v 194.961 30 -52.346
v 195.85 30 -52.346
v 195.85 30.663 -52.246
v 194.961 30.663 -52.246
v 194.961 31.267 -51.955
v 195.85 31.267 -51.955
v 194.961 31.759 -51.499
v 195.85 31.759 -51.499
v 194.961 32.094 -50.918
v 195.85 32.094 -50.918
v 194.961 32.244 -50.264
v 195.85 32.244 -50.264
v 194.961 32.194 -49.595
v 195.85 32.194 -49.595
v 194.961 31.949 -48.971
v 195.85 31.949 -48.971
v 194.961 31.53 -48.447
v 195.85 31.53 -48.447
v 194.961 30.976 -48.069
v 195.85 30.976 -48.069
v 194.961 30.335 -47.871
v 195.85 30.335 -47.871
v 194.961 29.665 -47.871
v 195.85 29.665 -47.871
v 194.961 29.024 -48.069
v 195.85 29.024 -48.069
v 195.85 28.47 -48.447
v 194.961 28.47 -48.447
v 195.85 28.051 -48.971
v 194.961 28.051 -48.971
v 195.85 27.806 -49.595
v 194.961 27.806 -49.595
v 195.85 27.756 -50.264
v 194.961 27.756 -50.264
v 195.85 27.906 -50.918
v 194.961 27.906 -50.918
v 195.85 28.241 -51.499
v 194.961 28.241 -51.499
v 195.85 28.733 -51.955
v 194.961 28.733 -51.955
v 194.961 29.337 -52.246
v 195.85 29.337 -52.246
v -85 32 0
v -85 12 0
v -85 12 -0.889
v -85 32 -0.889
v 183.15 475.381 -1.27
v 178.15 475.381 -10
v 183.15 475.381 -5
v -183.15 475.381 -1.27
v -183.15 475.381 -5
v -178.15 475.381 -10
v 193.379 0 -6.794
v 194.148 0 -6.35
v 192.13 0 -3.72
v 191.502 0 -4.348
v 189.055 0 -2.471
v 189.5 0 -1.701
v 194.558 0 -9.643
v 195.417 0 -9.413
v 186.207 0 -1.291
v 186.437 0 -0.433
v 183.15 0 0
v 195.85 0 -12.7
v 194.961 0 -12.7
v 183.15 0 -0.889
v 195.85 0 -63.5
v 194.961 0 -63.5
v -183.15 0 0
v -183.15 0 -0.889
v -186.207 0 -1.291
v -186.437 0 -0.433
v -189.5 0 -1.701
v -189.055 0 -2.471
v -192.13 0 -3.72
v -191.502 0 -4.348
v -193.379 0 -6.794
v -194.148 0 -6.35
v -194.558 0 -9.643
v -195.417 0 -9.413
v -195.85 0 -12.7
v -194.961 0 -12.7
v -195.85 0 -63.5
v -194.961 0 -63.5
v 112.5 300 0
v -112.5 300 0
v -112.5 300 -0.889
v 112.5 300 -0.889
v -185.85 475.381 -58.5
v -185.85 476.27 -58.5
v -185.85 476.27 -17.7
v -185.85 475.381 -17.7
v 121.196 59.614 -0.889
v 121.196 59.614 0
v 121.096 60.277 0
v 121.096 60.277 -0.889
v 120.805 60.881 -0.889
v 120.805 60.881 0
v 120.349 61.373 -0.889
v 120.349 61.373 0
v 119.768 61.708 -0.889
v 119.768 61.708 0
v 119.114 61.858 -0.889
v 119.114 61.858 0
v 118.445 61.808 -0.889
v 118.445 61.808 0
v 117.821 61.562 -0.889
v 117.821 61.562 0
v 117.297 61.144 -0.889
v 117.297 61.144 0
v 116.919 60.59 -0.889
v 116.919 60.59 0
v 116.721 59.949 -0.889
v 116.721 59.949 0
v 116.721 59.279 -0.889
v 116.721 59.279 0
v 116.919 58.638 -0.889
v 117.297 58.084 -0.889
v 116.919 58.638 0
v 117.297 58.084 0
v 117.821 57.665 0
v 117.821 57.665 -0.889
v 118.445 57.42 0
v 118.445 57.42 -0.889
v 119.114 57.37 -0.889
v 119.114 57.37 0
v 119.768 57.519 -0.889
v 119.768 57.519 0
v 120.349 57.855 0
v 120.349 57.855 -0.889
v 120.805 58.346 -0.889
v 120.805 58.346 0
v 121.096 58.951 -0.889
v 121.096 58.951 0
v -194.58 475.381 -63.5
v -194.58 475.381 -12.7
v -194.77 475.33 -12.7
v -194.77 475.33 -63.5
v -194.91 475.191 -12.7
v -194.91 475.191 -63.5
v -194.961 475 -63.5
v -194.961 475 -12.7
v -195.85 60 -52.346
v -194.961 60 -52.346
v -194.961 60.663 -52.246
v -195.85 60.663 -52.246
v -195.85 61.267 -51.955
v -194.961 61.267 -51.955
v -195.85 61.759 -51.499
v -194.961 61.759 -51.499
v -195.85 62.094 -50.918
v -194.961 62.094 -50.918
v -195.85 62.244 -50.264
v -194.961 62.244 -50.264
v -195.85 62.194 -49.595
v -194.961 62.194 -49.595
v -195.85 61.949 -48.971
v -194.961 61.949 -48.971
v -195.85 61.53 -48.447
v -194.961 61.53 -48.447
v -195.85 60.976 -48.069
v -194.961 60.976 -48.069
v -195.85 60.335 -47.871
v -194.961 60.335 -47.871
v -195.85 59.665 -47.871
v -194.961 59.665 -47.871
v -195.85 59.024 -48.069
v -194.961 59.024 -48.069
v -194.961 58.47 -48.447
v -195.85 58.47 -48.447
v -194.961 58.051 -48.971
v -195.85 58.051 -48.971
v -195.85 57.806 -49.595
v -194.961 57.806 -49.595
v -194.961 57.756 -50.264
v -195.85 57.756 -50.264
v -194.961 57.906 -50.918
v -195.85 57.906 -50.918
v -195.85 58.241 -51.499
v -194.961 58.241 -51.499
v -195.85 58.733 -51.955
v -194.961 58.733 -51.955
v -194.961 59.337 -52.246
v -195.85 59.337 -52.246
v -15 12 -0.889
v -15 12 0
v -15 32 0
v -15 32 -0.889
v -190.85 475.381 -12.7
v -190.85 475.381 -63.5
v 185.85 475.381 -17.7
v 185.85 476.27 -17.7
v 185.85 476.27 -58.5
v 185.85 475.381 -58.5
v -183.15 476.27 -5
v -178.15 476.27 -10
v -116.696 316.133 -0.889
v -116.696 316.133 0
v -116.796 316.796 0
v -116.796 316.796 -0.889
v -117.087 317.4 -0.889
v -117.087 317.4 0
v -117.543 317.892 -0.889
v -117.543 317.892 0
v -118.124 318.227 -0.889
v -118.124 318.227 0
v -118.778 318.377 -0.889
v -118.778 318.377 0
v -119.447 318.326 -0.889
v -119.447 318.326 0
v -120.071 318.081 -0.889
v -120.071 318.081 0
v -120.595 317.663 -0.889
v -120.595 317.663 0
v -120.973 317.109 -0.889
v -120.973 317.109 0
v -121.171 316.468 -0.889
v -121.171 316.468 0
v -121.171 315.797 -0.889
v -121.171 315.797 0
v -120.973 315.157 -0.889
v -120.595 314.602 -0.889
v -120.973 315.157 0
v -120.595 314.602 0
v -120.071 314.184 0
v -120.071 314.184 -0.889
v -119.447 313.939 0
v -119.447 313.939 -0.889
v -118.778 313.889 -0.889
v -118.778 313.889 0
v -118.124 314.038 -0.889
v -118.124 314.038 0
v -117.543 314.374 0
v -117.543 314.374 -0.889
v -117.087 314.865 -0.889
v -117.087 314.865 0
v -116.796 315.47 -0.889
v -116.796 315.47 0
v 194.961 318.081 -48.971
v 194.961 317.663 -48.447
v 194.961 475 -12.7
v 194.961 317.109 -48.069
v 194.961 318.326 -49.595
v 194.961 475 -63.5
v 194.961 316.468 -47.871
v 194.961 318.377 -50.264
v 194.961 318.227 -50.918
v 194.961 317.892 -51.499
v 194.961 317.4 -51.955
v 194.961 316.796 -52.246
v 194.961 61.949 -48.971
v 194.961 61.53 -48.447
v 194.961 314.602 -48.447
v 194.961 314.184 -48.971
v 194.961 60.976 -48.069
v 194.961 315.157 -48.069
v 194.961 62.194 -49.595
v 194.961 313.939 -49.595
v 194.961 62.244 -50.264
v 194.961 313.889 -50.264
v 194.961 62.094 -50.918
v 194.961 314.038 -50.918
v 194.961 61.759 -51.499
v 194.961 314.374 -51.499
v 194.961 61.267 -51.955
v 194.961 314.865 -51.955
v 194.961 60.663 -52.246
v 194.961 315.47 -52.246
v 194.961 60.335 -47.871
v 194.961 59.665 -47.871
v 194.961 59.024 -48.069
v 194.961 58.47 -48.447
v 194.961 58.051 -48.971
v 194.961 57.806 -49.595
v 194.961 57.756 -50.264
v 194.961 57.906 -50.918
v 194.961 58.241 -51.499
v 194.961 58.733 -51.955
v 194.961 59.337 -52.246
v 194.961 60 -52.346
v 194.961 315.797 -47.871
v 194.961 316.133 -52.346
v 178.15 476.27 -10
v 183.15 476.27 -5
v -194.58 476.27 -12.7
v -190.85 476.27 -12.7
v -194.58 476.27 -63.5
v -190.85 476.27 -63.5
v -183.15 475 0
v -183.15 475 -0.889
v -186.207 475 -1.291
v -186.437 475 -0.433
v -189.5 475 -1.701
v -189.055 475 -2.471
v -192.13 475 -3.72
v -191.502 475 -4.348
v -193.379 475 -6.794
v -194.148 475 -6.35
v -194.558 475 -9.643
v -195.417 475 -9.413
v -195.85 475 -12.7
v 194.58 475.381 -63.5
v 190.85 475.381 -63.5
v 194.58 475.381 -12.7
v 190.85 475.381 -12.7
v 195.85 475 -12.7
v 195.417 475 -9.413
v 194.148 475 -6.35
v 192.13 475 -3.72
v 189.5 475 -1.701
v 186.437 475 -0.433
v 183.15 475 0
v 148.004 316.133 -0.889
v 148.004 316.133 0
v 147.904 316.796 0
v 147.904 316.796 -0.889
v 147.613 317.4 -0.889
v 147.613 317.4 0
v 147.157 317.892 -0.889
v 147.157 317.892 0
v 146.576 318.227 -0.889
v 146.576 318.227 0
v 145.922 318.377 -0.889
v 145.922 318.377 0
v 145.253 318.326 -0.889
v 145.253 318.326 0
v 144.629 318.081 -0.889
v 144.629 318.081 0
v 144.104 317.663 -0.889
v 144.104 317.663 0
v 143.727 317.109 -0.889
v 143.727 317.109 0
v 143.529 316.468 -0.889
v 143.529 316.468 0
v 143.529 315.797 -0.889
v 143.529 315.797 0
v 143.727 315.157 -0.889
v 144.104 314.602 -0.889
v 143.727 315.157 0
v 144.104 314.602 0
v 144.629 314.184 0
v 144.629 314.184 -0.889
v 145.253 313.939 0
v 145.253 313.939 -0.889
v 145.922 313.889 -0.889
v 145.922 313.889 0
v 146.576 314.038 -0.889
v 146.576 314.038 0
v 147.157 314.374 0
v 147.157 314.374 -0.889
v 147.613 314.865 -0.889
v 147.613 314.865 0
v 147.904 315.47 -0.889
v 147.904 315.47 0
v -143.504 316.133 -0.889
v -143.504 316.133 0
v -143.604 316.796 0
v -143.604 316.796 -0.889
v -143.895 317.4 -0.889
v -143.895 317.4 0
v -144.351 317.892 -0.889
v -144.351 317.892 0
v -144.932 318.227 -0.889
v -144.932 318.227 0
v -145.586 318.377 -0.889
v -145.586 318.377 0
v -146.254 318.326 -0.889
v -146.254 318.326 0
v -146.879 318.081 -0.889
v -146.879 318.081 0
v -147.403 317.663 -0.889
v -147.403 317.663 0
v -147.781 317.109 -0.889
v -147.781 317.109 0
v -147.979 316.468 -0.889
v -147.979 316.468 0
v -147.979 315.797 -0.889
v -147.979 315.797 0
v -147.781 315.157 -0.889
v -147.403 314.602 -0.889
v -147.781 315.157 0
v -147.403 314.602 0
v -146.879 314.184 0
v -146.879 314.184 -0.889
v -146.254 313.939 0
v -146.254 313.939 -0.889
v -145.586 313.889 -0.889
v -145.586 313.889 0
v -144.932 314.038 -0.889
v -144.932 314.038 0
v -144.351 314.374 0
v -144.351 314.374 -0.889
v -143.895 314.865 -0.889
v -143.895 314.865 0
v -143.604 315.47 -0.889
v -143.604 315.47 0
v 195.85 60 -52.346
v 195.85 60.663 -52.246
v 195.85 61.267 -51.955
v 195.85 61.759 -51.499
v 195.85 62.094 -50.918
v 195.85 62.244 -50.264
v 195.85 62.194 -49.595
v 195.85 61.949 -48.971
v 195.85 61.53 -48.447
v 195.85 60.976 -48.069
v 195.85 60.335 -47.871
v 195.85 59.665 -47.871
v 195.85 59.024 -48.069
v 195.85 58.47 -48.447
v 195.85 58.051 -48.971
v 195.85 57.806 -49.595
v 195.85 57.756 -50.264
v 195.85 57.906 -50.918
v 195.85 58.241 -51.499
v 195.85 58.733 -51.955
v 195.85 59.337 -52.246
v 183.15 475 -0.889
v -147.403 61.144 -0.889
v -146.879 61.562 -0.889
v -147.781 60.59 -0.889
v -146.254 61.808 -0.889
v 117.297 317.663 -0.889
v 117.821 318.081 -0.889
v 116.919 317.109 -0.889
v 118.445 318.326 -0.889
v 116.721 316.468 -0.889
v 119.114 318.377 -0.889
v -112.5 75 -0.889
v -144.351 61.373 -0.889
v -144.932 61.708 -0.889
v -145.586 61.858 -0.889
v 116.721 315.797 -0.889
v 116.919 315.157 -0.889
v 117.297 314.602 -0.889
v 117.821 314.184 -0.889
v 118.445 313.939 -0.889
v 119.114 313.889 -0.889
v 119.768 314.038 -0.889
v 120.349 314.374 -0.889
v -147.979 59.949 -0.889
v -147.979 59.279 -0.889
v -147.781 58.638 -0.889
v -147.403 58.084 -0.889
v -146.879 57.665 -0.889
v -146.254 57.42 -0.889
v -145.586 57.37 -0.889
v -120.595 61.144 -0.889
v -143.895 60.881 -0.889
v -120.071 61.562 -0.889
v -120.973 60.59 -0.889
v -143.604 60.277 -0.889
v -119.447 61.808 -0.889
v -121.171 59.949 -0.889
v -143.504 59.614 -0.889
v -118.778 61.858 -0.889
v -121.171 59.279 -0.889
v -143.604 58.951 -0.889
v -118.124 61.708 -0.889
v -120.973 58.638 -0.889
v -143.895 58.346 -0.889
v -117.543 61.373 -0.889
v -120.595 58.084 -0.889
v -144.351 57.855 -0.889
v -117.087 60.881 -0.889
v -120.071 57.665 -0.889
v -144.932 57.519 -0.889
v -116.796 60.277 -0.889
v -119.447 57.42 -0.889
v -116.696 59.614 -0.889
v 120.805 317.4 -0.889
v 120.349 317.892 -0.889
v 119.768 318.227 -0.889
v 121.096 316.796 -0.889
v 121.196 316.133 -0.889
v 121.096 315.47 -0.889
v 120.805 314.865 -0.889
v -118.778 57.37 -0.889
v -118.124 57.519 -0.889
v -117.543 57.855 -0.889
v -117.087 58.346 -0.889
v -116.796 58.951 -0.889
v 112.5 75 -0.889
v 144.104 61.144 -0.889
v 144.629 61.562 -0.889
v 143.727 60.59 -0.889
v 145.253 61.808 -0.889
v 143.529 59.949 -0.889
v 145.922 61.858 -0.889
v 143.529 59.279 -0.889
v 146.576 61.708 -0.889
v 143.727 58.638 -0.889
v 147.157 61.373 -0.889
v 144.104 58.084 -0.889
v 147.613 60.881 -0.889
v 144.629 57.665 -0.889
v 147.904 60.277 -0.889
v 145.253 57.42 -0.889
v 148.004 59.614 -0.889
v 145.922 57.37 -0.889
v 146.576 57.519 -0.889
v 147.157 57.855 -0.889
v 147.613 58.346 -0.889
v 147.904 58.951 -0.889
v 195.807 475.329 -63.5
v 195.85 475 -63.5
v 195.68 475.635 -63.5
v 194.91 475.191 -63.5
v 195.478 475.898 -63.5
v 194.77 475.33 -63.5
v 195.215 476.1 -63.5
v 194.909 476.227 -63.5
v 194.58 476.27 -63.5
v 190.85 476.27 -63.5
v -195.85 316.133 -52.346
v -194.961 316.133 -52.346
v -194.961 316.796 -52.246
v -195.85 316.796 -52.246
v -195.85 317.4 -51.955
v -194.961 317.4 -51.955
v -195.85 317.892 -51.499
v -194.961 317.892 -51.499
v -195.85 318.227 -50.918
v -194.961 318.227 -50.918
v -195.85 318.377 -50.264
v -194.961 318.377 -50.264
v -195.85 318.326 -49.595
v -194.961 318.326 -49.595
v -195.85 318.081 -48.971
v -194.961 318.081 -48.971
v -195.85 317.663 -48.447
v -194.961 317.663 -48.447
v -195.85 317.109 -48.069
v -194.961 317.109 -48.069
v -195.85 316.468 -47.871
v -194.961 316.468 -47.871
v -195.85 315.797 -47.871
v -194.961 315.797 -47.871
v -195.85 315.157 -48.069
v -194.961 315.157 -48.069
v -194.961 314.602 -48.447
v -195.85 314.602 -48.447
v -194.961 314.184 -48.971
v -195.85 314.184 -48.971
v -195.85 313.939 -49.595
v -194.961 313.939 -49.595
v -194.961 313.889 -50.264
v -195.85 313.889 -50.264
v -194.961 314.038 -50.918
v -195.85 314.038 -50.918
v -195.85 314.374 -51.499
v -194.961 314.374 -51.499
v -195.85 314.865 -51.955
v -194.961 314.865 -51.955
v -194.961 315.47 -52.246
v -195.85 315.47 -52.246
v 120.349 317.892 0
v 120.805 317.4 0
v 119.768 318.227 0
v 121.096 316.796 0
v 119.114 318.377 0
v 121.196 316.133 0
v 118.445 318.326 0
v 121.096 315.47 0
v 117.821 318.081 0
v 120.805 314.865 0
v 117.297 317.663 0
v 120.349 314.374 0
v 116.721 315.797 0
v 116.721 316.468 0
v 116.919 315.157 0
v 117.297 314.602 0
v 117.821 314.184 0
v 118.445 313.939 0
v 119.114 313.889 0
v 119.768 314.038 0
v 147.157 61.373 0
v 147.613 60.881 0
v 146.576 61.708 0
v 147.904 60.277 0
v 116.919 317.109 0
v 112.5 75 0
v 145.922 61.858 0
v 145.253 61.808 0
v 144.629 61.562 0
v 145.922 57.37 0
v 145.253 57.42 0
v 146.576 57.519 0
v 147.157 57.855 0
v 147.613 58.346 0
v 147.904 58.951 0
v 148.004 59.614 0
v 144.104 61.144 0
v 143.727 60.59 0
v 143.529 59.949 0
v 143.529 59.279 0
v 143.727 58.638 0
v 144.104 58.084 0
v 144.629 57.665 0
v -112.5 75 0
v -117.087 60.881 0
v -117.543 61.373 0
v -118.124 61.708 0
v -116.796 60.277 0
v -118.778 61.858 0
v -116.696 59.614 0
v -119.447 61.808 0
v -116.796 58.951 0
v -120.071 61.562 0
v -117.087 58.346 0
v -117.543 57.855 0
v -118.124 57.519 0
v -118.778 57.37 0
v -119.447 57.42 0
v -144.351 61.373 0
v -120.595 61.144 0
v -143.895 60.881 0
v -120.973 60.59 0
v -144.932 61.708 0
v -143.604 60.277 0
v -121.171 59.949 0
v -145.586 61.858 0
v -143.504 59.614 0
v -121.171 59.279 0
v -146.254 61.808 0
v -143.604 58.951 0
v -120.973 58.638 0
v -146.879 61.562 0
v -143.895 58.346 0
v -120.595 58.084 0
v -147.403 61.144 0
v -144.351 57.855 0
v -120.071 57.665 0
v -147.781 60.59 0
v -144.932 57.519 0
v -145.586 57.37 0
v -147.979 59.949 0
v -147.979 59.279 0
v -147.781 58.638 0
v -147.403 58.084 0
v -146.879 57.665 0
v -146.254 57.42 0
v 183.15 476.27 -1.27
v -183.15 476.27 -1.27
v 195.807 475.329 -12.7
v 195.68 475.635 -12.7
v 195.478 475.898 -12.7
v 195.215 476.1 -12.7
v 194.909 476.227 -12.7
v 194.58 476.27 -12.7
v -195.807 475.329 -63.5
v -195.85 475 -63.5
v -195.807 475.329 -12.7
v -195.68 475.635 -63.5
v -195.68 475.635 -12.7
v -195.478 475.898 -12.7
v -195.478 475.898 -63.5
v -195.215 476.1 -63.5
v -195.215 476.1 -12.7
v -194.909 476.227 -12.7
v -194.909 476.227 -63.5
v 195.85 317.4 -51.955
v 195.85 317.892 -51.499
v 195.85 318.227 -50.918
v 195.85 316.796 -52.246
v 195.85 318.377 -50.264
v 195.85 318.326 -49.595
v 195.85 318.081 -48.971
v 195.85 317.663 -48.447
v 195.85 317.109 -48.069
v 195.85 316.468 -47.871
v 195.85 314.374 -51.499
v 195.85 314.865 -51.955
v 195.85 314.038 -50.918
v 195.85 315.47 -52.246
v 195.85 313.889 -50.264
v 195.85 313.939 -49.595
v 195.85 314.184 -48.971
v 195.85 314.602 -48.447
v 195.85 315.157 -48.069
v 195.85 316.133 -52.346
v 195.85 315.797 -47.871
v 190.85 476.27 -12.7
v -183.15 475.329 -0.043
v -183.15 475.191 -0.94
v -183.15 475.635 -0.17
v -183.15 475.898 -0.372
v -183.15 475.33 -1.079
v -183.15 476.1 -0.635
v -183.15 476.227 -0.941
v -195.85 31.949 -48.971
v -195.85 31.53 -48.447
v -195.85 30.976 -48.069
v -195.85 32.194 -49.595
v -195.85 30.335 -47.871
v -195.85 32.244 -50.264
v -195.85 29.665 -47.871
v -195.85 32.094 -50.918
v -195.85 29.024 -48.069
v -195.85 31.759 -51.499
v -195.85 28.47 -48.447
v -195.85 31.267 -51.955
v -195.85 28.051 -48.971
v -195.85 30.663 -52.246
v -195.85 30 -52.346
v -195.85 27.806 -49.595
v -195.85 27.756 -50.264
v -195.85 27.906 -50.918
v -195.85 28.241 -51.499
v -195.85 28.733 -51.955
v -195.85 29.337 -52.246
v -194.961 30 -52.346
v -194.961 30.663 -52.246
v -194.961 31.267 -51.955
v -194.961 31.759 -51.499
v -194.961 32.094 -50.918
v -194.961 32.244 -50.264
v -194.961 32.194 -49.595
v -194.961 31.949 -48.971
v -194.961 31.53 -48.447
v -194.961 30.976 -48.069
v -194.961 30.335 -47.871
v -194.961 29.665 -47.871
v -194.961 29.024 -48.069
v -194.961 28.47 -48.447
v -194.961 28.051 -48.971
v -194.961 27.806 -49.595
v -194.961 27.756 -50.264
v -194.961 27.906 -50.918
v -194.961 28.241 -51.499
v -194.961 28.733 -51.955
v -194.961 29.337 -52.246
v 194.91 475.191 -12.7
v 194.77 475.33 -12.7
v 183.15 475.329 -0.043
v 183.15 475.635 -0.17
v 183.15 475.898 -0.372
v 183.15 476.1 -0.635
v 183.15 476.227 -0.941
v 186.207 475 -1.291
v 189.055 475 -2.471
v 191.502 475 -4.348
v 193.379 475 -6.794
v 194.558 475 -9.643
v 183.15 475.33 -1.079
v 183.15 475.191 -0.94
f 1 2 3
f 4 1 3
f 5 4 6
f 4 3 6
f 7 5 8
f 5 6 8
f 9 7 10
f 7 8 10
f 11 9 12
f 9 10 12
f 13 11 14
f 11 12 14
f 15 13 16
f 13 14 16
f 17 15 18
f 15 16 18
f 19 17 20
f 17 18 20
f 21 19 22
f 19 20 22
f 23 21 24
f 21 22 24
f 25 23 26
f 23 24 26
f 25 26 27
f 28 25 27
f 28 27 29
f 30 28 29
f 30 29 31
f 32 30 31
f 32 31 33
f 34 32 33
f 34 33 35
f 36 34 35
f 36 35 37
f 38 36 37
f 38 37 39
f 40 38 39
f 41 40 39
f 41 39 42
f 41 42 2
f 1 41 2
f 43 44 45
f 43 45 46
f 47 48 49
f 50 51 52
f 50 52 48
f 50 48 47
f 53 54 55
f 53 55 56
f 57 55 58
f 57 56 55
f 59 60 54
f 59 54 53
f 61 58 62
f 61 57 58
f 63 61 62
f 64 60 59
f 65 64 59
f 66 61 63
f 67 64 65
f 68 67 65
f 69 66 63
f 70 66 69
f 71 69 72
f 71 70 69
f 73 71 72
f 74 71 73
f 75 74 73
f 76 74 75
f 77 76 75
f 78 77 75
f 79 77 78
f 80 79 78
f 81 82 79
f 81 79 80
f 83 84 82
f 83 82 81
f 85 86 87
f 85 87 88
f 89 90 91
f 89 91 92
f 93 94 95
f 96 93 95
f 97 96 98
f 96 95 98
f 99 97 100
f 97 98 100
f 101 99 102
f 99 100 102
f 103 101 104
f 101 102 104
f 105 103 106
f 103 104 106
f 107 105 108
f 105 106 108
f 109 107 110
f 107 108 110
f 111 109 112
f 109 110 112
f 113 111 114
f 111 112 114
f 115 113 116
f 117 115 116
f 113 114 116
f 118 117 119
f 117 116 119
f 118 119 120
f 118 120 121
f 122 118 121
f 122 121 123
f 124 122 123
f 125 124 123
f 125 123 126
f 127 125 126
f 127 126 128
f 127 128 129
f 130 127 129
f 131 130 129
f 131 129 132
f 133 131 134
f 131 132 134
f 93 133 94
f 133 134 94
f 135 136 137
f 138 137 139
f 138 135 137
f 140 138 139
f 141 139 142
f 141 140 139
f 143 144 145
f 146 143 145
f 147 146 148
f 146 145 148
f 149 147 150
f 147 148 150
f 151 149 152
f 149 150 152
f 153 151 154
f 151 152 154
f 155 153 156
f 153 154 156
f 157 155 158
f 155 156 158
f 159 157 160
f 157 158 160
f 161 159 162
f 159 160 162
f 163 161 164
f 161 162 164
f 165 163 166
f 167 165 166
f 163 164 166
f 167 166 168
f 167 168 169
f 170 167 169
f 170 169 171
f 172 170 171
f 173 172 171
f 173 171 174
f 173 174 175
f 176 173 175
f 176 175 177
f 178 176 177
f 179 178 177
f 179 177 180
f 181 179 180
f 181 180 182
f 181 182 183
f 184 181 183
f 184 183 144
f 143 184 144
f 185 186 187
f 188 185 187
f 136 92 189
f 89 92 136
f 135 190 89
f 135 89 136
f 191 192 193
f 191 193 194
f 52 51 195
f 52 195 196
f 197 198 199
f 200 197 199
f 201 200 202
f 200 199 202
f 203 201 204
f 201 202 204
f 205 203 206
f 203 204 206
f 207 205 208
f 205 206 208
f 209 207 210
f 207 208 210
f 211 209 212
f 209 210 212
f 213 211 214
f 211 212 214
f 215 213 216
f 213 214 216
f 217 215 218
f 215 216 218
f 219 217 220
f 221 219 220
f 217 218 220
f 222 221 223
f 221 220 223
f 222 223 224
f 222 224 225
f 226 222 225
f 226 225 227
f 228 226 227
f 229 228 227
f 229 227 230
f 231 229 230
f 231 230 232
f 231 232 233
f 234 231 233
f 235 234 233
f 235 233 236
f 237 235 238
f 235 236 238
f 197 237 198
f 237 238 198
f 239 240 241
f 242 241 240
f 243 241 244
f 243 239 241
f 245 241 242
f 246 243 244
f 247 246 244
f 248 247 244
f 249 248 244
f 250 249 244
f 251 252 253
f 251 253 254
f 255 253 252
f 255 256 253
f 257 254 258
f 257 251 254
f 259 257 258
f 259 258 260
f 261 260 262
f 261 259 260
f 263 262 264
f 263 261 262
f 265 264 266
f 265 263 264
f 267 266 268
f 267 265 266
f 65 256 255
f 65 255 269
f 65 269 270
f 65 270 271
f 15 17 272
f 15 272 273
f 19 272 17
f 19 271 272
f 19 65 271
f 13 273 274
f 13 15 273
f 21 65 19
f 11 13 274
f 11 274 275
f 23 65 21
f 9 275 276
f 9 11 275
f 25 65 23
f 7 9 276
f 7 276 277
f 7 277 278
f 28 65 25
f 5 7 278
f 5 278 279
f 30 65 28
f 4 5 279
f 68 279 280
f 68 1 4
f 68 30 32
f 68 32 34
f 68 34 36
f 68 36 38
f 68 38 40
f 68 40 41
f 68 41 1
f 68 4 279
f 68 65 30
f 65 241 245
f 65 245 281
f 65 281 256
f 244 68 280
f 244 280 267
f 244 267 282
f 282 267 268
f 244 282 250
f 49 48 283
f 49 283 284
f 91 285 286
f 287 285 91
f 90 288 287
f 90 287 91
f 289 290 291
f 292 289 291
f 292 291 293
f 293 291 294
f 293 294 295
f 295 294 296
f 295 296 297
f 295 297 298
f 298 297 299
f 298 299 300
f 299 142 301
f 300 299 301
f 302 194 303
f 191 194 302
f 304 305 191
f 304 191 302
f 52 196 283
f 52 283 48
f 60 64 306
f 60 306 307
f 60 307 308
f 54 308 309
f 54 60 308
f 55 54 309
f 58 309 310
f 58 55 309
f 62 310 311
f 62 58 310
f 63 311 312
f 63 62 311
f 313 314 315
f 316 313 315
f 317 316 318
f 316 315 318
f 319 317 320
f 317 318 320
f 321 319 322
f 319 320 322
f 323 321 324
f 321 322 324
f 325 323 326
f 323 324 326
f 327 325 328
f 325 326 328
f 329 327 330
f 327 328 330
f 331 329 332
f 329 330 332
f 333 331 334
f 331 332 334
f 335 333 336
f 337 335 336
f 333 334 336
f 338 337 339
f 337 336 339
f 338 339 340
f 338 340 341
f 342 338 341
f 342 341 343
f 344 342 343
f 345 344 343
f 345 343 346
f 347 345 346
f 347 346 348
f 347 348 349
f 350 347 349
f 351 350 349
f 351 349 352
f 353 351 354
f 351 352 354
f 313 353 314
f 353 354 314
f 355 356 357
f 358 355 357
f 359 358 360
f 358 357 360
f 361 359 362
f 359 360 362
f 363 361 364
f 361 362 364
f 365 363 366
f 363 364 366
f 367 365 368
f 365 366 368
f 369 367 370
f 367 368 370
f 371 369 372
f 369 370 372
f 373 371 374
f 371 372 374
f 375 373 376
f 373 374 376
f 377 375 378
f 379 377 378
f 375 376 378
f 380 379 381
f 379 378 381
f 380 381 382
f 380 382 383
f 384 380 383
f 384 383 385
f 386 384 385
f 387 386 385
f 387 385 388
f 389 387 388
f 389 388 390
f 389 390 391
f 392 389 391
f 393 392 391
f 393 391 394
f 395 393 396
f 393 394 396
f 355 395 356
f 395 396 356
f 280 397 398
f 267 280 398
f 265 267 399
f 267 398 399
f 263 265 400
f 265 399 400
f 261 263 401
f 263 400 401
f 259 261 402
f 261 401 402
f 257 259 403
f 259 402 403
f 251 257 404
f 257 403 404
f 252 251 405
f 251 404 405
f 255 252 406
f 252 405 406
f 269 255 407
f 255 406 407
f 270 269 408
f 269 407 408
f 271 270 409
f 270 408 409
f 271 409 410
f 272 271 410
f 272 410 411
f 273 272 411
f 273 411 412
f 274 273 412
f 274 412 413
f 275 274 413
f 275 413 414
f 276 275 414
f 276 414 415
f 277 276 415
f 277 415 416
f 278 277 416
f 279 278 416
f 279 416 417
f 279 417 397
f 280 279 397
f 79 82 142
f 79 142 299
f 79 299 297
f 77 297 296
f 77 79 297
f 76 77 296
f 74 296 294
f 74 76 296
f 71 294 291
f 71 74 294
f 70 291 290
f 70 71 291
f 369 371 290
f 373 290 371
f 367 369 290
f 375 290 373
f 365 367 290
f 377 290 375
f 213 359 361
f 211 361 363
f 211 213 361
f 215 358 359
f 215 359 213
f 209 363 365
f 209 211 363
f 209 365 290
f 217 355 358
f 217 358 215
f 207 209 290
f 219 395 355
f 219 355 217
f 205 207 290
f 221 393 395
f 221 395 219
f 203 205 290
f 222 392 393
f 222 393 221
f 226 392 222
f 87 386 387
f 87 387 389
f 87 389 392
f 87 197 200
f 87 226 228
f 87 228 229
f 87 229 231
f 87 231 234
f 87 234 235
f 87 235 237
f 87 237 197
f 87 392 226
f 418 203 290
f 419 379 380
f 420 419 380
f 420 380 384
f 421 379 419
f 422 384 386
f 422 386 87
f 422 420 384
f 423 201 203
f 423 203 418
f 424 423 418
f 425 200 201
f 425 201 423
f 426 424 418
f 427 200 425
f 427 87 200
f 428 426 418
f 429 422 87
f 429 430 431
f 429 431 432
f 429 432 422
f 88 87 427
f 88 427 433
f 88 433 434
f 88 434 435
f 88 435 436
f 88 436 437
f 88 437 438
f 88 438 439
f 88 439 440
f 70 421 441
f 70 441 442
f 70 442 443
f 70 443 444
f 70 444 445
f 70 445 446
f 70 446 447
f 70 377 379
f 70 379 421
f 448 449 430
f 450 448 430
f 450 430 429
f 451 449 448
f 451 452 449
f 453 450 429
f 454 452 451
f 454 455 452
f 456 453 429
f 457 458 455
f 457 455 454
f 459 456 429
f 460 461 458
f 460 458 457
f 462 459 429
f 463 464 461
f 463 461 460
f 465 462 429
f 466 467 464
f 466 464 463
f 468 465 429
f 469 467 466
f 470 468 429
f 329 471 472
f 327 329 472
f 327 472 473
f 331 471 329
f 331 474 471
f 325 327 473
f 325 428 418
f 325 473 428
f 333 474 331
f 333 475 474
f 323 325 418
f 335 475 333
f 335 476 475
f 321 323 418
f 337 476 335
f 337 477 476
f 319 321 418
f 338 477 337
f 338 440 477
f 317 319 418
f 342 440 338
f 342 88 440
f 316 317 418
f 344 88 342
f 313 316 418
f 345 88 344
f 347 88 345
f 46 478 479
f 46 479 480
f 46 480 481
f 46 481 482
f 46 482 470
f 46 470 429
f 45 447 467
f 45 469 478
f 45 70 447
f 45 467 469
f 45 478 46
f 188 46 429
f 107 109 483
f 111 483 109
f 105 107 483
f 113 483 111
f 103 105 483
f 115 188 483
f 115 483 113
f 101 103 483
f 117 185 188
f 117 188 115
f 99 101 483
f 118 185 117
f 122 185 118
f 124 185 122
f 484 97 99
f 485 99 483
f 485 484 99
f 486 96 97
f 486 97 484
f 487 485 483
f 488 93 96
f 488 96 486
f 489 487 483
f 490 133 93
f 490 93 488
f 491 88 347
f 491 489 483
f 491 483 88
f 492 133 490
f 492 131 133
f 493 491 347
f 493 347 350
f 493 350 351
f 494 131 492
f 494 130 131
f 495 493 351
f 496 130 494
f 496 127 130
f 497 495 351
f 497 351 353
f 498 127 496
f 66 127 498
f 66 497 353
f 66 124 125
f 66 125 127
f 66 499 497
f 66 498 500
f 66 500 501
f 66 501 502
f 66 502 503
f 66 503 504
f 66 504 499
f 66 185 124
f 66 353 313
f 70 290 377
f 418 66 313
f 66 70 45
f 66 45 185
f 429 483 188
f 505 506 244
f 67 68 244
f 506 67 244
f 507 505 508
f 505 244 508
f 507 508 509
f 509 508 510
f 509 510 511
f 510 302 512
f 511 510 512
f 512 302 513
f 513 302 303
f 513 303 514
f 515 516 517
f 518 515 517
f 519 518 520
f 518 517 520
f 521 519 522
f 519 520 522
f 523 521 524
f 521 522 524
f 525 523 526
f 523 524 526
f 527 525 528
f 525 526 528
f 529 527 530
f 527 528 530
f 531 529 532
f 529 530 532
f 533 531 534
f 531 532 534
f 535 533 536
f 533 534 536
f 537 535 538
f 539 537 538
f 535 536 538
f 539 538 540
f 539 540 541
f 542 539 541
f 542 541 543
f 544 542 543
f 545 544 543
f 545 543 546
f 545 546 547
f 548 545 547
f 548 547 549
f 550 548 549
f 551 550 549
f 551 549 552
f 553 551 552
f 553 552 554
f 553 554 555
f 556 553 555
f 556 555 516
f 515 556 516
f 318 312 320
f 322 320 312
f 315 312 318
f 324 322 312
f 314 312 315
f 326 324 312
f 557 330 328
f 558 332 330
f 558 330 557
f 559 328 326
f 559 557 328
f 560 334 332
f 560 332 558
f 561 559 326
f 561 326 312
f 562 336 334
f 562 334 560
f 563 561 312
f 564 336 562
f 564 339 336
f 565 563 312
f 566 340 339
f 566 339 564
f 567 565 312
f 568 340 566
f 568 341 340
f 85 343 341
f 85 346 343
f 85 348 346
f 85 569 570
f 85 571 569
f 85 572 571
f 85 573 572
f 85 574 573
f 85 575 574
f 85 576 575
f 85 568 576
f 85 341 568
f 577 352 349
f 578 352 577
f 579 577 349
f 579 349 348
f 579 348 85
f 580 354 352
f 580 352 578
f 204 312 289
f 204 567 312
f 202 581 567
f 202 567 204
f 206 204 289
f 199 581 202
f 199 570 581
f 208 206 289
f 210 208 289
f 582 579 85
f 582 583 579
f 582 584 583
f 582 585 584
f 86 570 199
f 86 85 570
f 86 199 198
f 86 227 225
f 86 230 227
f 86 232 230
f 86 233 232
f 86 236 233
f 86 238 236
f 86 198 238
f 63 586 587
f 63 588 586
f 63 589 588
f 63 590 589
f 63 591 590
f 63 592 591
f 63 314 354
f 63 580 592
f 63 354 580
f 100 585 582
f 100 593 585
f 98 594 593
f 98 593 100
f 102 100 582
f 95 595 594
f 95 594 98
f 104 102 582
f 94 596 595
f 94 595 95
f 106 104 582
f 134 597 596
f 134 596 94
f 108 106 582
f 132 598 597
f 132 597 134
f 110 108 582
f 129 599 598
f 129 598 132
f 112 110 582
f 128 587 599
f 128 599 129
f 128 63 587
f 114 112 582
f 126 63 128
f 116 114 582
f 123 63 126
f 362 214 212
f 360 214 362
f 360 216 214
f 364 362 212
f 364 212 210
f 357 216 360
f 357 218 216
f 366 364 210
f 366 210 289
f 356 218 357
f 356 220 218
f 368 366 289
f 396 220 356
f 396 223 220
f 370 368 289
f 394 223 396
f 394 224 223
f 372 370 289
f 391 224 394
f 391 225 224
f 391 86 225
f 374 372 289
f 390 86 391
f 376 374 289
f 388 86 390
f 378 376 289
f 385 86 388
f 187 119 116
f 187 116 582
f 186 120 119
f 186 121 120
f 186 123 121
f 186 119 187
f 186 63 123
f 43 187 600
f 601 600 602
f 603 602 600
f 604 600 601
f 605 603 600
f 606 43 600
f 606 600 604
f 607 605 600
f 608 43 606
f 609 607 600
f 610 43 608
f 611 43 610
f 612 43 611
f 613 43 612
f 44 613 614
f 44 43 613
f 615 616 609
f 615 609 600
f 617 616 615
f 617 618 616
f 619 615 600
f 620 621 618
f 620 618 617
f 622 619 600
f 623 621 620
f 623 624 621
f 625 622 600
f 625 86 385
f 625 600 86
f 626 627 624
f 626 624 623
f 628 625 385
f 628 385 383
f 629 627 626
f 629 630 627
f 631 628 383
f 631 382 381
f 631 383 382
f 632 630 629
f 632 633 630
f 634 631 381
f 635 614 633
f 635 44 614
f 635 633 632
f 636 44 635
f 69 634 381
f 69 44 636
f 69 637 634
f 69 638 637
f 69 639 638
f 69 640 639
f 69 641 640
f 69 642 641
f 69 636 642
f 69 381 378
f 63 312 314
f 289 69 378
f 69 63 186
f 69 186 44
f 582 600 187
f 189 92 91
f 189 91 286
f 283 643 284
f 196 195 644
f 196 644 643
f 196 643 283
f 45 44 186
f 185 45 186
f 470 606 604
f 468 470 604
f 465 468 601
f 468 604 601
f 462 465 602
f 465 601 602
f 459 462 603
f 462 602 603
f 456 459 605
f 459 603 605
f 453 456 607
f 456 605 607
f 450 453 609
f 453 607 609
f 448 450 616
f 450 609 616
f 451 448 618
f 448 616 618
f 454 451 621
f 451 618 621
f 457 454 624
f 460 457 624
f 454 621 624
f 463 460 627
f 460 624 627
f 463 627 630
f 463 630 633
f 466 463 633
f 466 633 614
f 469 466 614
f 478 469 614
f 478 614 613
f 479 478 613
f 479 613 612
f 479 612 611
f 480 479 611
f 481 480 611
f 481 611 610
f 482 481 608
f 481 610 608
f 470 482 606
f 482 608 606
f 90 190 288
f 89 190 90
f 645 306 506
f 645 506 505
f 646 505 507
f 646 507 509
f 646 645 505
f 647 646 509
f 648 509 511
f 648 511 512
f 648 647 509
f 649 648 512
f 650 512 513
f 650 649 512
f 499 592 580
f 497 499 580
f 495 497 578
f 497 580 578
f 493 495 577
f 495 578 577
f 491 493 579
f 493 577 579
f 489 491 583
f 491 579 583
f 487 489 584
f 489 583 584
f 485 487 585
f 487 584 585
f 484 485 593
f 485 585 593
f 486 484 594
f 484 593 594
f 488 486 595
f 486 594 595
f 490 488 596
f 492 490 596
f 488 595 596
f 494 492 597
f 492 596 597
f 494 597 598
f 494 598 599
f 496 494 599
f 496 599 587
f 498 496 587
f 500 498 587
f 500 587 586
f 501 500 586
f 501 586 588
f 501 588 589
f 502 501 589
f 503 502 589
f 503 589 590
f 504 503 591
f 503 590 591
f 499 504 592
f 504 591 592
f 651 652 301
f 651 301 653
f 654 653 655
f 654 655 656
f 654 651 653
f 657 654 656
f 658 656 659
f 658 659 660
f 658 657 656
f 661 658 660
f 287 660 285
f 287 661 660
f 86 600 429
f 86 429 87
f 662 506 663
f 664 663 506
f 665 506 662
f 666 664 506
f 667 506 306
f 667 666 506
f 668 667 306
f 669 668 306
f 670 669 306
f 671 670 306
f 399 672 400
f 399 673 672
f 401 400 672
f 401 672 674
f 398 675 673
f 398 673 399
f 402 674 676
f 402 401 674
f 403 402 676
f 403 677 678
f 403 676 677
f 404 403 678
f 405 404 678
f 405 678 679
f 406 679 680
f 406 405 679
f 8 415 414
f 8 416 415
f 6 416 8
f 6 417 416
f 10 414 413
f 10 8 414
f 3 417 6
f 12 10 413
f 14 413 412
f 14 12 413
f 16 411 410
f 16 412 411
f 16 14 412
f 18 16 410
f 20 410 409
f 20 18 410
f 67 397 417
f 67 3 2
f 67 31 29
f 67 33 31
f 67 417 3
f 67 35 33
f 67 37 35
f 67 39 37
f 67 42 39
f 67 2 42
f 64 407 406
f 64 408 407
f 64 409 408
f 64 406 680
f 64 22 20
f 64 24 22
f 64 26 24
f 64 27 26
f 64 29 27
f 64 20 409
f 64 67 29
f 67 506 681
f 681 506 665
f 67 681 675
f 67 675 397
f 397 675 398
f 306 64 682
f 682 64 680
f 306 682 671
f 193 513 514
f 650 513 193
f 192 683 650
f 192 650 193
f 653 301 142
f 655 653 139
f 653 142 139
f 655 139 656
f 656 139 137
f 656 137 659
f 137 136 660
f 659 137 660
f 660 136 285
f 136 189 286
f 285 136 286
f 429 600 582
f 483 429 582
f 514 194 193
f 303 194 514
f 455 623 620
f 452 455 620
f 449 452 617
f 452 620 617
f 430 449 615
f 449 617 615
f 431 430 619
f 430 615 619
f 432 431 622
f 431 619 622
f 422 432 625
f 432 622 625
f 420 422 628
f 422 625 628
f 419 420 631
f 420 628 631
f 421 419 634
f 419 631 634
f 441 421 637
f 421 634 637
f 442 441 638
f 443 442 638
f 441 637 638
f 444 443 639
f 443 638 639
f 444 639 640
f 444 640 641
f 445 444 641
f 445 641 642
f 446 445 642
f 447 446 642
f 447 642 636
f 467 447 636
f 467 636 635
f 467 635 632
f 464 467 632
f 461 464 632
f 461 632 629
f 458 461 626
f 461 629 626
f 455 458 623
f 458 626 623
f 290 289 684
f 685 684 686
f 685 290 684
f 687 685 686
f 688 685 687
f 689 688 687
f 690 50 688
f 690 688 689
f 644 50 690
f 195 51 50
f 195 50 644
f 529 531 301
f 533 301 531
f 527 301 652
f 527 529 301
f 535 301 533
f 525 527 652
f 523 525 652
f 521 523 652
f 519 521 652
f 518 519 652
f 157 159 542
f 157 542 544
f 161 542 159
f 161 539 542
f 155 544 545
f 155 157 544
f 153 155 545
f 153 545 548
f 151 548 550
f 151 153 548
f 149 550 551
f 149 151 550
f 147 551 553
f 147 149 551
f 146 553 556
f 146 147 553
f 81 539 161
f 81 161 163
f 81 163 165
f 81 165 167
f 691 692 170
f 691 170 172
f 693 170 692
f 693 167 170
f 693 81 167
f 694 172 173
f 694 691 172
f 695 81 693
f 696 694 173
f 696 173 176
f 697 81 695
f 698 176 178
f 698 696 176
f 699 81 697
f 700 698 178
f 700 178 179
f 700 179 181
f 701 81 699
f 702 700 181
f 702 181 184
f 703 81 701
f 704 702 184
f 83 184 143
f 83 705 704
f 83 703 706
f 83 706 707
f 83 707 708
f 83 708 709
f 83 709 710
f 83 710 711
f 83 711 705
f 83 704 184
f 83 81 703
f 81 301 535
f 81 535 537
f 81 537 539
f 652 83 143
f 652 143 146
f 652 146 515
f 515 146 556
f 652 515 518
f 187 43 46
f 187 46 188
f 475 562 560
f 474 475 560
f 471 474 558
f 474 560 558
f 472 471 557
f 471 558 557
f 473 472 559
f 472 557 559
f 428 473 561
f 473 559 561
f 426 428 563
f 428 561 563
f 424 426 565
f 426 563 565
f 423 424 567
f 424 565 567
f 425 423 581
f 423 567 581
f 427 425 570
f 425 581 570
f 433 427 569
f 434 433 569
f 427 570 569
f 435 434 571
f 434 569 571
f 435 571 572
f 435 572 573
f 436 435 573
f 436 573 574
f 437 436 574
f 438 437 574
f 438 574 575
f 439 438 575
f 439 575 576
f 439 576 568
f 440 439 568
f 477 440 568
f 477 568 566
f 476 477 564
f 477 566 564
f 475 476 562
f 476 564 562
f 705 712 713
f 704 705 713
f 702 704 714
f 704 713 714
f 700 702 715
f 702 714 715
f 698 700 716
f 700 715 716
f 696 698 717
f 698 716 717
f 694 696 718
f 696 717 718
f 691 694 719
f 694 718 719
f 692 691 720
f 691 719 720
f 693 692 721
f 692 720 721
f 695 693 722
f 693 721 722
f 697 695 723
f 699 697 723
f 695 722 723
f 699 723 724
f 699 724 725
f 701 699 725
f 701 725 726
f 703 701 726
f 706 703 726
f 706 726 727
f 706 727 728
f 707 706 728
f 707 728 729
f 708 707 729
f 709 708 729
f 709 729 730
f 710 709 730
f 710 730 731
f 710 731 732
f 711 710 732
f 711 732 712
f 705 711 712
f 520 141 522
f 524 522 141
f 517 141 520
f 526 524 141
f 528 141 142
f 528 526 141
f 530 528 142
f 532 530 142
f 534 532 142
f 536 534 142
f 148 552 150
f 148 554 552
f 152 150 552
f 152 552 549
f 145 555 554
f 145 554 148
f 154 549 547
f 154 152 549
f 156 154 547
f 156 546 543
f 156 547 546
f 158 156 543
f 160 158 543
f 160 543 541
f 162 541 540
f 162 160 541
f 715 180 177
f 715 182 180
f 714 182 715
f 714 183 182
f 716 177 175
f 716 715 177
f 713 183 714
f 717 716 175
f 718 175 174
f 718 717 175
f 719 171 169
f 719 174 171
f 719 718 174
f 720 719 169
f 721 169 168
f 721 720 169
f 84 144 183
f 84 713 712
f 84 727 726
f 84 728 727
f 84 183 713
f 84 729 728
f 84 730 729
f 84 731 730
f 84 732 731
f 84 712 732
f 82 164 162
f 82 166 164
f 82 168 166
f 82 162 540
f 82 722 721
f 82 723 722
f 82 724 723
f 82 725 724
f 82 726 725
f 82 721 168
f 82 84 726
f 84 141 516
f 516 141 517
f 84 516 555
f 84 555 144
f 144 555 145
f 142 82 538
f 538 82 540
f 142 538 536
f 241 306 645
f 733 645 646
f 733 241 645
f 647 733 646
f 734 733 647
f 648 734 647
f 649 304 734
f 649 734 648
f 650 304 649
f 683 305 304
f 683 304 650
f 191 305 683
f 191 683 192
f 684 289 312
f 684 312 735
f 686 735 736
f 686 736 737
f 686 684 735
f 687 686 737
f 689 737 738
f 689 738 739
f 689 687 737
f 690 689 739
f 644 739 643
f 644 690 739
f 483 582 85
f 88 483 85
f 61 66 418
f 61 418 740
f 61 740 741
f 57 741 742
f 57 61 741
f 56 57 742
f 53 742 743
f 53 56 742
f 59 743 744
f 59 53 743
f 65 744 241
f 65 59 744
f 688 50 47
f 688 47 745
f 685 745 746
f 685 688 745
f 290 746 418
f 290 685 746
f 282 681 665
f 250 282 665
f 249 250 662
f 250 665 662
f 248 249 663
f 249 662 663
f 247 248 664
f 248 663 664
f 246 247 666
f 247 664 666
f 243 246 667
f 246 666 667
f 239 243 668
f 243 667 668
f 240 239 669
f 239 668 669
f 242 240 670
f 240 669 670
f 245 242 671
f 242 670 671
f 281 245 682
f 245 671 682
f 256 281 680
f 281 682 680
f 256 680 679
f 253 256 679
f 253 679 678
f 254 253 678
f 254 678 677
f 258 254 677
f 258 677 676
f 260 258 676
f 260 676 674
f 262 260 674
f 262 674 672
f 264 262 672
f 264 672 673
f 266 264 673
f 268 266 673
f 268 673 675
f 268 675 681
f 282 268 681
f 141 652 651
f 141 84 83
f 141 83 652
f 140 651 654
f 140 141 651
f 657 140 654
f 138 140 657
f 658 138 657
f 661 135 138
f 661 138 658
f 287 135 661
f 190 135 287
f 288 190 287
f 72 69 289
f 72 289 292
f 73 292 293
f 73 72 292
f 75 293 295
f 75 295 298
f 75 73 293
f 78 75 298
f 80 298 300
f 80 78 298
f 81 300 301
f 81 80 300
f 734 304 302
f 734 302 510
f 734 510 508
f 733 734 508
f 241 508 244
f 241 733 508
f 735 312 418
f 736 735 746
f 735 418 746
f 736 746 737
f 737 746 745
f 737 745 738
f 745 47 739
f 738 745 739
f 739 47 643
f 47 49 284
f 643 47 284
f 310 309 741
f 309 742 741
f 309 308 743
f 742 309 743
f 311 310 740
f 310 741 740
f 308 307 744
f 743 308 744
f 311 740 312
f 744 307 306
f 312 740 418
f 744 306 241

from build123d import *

# Parameters (mm, degrees)
BASE_FLANGE2_DEPTH        = 475
SKETCH6_W                 = 225
SKETCH6_H                 = 225
CUT_EXTRUDE2_DEPTH        = 2.54
SKETCH13_R                = 2.25
CUT_EXTRUDE4_DEPTH        = 619.939427238
SKETCH14_R                = 2.25
CUT_EXTRUDE5_DEPTH        = 0.889
SKETCH15_W                = 70
SKETCH15_H                = 20
CUT_EXTRUDE6_DEPTH        = 0.889
EDGE_FLANGE1_DEPTH        = 50.8
EDGE_FLANGE1_BEND_DEPTH   = 366.299839916
EDGE_FLANGE1_BEND_2_DEPTH = 50.8
BREAK_CORNER1_START       = 475.381
BREAK_CORNER1_DEPTH       = 0.889


# Read off the part's stored shape, not the designer's step: Break-Corner1
# Sheet-metal steps are written as plain solids
with BuildPart() as part:
    # Sketch1 → Base-Flange2 (new body)
    with BuildSketch(Plane(origin=(0, 0, 0), x_dir=(1, 0, 0), z_dir=(0, 1, 0))):
        with BuildLine():
            Line((195.849919958, 63.5), (195.849919958, 12.7))
            ThreePointArc((195.849919958, 12.7), (192.130176079, 3.719743879), (183.149919958, 0))
            Line((183.149919958, 0), (-183.149919958, 0))
            ThreePointArc((-183.149919958, 0), (-192.130176079, 3.719743879), (-195.849919958, 12.7))
            Line((-195.849919958, 12.7), (-195.849919958, 63.5))
            Line((-195.849919958, 63.5), (-194.960919958, 63.5))
            Line((-194.960919958, 63.5), (-194.960919958, 12.7))
            ThreePointArc((-194.960919958, 12.7), (-191.501558151, 4.348361807), (-183.149919958, 0.889))
            Line((-183.149919958, 0.889), (183.149919958, 0.889))
            ThreePointArc((183.149919958, 0.889), (191.501558151, 4.348361807), (194.960919958, 12.7))
            Line((194.960919958, 12.7), (194.960919958, 63.5))
            Line((194.960919958, 63.5), (195.849919958, 63.5))
        make_face()
    extrude(amount=BASE_FLANGE2_DEPTH)

    # Sketch6 → Cut-Extrude2 (cut)
    with BuildSketch(Plane.XY):
        with Locations((0, 187.5)):
            Rectangle(SKETCH6_W, SKETCH6_H)
    extrude(amount=-CUT_EXTRUDE2_DEPTH, mode=Mode.SUBTRACT)

    # Sketch13 → Cut-Extrude4 (cut, through all)
    with BuildSketch(Plane(origin=(195.849919958, 0, 0), x_dir=(0, 0, -1), z_dir=(1, 0, 0))):
        with Locations((50.096107, 60)):
            Circle(SKETCH13_R)
        with Locations((50.096107, 316.132840032)):
            Circle(SKETCH13_R)
        with Locations((50.096107, 30)):
            Circle(SKETCH13_R)
    extrude(amount=-CUT_EXTRUDE4_DEPTH, mode=Mode.SUBTRACT)

    # Sketch14 → Cut-Extrude5 (cut)
    with BuildSketch(Plane.XY):
        with Locations((-145.753813013, 316.132839976)):
            Circle(SKETCH14_R)
        with Locations((-118.946026903, 316.132839976)):
            Circle(SKETCH14_R)
        with Locations((118.946026903, 316.132839976)):
            Circle(SKETCH14_R)
        with Locations((145.753813013, 316.132839976)):
            Circle(SKETCH14_R)
        with Locations((145.753813013, 59.61392)):
            Circle(SKETCH14_R)
        with Locations((118.946026903, 59.61392)):
            Circle(SKETCH14_R)
        with Locations((-118.946026903, 59.61392)):
            Circle(SKETCH14_R)
        with Locations((-145.753813013, 59.61392)):
            Circle(SKETCH14_R)
    extrude(amount=-CUT_EXTRUDE5_DEPTH, mode=Mode.SUBTRACT)

    # Sketch15 → Cut-Extrude6 (cut)
    with BuildSketch(Plane.XY):
        with Locations((-50, 22)):
            Rectangle(SKETCH15_W, SKETCH15_H)
    extrude(amount=-CUT_EXTRUDE6_DEPTH, mode=Mode.SUBTRACT)

    # Edge-Flange1 section (across the edge) → Edge-Flange1 (add)
    with BuildSketch(Plane(origin=(-194.960919958, 475.381, -63.5), x_dir=(0, -1, 0), z_dir=(0, 0, 1))):
        with BuildLine():
            Line((-0.889, 0.381), (-0.889, 9.111))
            Line((-0.889, 9.111), (0, 9.111))
            Line((0, 9.111), (0, 0.381))
            ThreePointArc((0, 0.381), (0.111592316, 0.111592316), (0.381, 0))
            Line((0.381, 0), (0.381, -0.889))
            ThreePointArc((0.381, -0.889), (-0.517025612, -0.517025612), (-0.889, 0.381))
        make_face()
    extrude(amount=EDGE_FLANGE1_DEPTH)

    # Edge-Flange1 section 2 (across the edge) → Edge-Flange1 bend (add)
    with BuildSketch(Plane(origin=(-183.149919958, 475.381, -0.889), x_dir=(0, -1, 0), z_dir=(1, 0, 0))):
        with BuildLine():
            Line((-0.889, 0.381), (-0.889, 9.111))
            Line((-0.889, 9.111), (0, 9.111))
            Line((0, 9.111), (0, 0.381))
            ThreePointArc((0, 0.381), (0.111592316, 0.111592316), (0.381, 0))
            Line((0.381, 0), (0.381, -0.889))
            ThreePointArc((0.381, -0.889), (-0.517025612, -0.517025612), (-0.889, 0.381))
        make_face()
    extrude(amount=EDGE_FLANGE1_BEND_DEPTH)

    # Edge-Flange1 section 3 (across the edge) → Edge-Flange1 bend 2 (add)
    with BuildSketch(Plane(origin=(194.960919958, 475.381, -12.7), x_dir=(0, -1, 0), z_dir=(0, 0, -1))):
        with BuildLine():
            Line((-0.889, 0.381), (-0.889, 9.111))
            Line((-0.889, 9.111), (0, 9.111))
            Line((0, 9.111), (0, 0.381))
            ThreePointArc((0, 0.381), (0.111592316, 0.111592316), (0.381, 0))
            Line((0.381, 0), (0.381, -0.889))
            ThreePointArc((0.381, -0.889), (-0.517025612, -0.517025612), (-0.889, 0.381))
        make_face()
    extrude(amount=EDGE_FLANGE1_BEND_2_DEPTH)

    # Break-Corner1 outline → Break-Corner1 (cut)
    with BuildSketch(Plane(origin=(0, 0, 0), x_dir=(1, 0, 0), z_dir=(0, 1, 0)).offset(BREAK_CORNER1_START)):
        Polygon((183.149919958, 10), (178.149919958, 10), (183.149919958, 5), align=None)
        Polygon((-183.149919958, 5), (-178.149919958, 10), (-183.149919958, 10), align=None)
        Polygon((185.849919958, 63.5), (185.849919958, 58.5), (190.849919958, 63.5), align=None)
        Polygon((190.849919958, 12.7), (185.849919958, 17.7), (185.849919958, 12.7), align=None)
        Polygon((-185.849919958, 12.7), (-185.849919958, 17.7), (-190.849919958, 12.7), align=None)
        Polygon((-190.849919958, 63.5), (-185.849919958, 58.5), (-185.849919958, 63.5), align=None)
    extrude(amount=BREAK_CORNER1_DEPTH, mode=Mode.SUBTRACT)


solid = part.part
